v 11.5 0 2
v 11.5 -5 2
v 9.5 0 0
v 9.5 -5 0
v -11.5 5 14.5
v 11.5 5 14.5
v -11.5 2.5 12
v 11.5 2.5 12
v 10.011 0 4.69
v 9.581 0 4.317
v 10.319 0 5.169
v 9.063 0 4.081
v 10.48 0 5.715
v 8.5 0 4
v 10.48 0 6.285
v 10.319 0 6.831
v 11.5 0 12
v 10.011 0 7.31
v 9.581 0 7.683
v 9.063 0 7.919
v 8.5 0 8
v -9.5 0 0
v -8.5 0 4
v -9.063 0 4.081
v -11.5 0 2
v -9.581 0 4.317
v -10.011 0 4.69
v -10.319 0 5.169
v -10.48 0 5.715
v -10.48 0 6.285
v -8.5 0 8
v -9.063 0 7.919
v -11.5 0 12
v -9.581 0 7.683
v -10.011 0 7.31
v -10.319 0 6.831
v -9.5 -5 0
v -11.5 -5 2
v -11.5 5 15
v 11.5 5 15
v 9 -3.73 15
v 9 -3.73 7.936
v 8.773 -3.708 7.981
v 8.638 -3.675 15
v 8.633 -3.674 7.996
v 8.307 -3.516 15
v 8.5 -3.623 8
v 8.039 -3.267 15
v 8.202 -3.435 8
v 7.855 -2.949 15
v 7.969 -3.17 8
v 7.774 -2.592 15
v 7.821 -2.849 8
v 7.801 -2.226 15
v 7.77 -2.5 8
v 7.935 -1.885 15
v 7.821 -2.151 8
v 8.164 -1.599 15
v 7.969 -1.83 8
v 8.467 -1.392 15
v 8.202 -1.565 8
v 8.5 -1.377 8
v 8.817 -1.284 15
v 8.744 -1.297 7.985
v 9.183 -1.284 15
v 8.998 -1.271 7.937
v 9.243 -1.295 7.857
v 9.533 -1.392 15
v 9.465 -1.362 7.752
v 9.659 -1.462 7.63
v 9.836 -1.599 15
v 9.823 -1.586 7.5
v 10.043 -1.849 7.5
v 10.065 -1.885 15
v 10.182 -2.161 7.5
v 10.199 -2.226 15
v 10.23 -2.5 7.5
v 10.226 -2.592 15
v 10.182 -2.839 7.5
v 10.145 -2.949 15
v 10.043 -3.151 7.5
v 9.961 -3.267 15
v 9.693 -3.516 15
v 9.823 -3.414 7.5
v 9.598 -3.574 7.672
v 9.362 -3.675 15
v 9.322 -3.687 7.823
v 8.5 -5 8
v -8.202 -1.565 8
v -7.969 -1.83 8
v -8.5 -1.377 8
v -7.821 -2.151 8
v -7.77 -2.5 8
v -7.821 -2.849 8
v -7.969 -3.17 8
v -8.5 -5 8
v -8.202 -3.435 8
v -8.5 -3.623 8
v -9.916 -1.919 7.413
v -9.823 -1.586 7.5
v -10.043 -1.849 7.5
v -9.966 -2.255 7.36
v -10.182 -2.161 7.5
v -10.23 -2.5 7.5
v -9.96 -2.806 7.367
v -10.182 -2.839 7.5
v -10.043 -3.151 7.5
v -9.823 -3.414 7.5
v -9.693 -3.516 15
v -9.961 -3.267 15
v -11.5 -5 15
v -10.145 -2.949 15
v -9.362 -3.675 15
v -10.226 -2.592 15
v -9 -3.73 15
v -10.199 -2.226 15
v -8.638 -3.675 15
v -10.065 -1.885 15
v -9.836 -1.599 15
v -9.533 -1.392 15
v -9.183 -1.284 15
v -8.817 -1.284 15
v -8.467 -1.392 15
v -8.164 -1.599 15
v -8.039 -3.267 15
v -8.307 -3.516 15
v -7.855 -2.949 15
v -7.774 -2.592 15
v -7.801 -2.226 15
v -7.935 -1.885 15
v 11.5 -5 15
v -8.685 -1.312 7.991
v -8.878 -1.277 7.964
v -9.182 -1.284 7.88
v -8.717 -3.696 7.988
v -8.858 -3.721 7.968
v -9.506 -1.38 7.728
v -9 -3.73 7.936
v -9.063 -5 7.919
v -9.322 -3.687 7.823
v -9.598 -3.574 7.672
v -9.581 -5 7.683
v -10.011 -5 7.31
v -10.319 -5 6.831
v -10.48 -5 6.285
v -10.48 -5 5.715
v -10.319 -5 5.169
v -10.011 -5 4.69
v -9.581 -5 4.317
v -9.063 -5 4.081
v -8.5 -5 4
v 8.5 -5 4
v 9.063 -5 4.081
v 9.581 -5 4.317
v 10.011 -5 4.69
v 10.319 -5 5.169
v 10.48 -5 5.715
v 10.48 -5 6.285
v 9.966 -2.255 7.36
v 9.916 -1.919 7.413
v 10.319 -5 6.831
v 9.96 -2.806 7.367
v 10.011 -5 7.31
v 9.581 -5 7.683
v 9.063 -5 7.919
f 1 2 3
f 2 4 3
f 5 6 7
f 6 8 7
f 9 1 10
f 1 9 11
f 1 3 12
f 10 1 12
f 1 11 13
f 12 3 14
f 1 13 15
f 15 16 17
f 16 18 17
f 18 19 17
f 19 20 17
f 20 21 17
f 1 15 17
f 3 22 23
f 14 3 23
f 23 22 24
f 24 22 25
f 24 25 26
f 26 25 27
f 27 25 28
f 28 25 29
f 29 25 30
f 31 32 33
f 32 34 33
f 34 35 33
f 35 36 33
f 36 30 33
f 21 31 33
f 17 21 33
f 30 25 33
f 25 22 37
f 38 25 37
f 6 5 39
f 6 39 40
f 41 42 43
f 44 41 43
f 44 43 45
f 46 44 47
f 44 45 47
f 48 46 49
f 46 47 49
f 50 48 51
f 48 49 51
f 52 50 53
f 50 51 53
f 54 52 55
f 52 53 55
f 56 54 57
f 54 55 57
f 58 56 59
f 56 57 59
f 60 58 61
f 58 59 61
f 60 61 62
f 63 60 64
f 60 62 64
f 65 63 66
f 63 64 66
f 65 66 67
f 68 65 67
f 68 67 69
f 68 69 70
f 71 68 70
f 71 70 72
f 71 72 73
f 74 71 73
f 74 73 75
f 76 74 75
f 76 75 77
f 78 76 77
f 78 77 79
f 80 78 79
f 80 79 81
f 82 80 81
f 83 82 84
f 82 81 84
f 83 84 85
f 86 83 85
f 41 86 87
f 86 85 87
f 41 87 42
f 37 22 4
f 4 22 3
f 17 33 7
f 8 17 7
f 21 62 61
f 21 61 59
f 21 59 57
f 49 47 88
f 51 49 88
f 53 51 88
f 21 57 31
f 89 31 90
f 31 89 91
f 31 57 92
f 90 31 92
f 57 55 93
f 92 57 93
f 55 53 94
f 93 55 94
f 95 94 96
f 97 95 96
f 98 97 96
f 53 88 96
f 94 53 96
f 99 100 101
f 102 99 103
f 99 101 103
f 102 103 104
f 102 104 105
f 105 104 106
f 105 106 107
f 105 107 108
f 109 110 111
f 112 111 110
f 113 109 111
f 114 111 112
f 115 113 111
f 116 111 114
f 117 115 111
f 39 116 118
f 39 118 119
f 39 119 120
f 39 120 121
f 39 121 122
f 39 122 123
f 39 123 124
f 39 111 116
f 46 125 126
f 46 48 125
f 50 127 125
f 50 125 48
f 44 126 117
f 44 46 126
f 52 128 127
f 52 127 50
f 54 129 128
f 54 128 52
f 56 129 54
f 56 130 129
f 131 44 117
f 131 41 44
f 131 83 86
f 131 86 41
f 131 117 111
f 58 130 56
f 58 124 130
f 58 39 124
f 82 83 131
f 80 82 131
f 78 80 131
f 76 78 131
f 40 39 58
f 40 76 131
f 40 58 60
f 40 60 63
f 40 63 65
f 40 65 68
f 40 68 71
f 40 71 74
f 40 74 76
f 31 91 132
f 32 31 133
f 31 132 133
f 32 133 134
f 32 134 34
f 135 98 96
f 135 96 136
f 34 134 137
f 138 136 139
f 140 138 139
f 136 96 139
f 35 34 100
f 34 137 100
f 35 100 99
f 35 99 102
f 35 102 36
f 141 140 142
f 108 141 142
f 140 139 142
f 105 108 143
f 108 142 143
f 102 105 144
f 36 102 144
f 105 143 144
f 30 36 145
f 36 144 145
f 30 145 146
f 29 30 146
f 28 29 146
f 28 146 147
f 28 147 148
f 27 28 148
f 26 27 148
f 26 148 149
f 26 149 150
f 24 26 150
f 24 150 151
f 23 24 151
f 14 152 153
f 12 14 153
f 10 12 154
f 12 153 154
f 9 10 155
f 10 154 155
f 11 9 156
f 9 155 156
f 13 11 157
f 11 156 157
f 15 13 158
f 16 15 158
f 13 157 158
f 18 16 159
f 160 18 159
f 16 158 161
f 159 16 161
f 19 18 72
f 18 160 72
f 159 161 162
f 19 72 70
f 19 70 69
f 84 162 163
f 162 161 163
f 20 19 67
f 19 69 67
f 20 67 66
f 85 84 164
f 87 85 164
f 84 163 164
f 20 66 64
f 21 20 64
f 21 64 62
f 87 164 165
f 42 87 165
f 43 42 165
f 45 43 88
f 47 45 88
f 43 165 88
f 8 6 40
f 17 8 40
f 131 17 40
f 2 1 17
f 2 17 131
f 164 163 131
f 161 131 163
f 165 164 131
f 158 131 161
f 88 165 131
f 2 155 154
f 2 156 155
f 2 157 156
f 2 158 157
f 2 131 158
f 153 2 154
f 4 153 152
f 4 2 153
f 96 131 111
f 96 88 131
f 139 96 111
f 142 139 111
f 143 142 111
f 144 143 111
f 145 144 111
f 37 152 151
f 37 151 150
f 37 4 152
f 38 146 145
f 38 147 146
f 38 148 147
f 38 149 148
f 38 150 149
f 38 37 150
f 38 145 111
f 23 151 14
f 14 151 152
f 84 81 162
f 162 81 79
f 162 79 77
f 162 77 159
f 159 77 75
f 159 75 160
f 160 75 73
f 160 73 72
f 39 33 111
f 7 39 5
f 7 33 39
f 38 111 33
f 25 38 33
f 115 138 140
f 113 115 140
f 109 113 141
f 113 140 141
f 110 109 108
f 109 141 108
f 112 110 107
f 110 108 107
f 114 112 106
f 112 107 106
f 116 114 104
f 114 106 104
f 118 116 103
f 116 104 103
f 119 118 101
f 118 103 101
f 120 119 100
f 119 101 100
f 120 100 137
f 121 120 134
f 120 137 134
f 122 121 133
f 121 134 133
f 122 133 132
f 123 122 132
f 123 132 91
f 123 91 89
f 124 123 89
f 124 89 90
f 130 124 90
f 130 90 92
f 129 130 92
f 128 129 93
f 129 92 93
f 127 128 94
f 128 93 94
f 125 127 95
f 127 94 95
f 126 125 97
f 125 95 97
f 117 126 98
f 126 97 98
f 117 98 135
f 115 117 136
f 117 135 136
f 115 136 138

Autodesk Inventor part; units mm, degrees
ref_plane "YZ Plane" through (0, 0, 0) normal (1, 0, 0) x (0, 1, 0)
ref_plane "XZ Plane" through (0, 0, 0) normal (0, 1, 0) x (-1, 0, 0)
ref_plane "XY Plane" through (0, 0, 0) normal (0, 0, 1) x (1, 0, 0)
sketch "Esboço1" plane through (0, 0, 0) normal (0, 0, 1) x (1, 0, 0)
  line L0 (-11.5, 5) -> (11.5, 5)
  line L1 (11.5, 5) -> (11.5, -5)
  line L2 (11.5, -5) -> (-11.5, -5)
  line L3 (-11.5, -5) -> (-11.5, 5)
  line L4 (-11.5, 5) -> (11.5, -5) construction
  line L5 (11.5, 5) -> (-11.5, -5) construction
  point P0 (0, 0)
  dimension "d0" = 10
  dimension "d1" = 23
extrude "Extrusão1" add sketch "Esboço1" along normal blind 15
chamfer "Chanfro1" distance 2 angle 45 2 edges at (-11.5, 0, 0) (11.5, 0, 0)
sketch "Esboço4" plane through (-11.5, -5, 15) normal (0, -1, 0) x (1, 0, 0)
  line L0 (11.5, -15) -> (11.5, -9)
  line L1 (3, -9) -> (20, -9) construction
  line L2 (3, -11) -> (20, -11)
  line L3 (20, -7) -> (3, -7)
  arc A0 (3, -7) -> (3, -11) centre (3, -9) ccw
  arc A1 (20, -11) -> (20, -7) centre (20, -9) ccw
  line L4 (23, -13) -> (23, 0) projected
  dimension "d18" = 6
  dimension "d19" = 4
  dimension "d20" = 3
extrude "Extrusão3" cut sketch "Esboço4" against normal through all
sketch "Esboço2" plane through (0, 0, 15) normal (0, 0, 1) x (1, 0, 0)
  line L0 (11.5, 5) -> (-11.5, 5) projected
  line L1 (-11.5, -5) -> (11.5, -5) projected
  line L2 (-9, -2.5) -> (9, -2.5)
  line L3 (0, 0) -> (0, -2.5)
  line L4 (-11.5, 5) -> (-11.5, -5) projected
  dimension "d32" = 2.5
  dimension "d36" = 2.5
hole "Furo1" at (-9, -2.5, 15) at (9, -2.5, 15) direction (0, 0, -1) diameter 2.459 depth 7.5 tip angle 118 thread size "M3x0.5" class "6H" standard "ISO Metric profile"
sketch "Esboço5" plane through (0, 0, 0) normal (1, 0, 0) x (0, 1, 0)
  line L0 (5, 0) -> (-5, 0) projected
  line L1 (5, 0) -> (0, 0)
  line L2 (0, 0) -> (0, 12)
  line L3 (0, 12) -> (5, 12)
  line L4 (5, 12) -> (5, 0)
  line L5 (-5, 0) -> (-5, 2) projected
  line L6 (5, 15) -> (-5, 15) projected
  point P0 (0, 0)
  point P1 (2.5, 0)
  dimension "d27" = 5
  dimension "d29" = 3
extrude "Extrusão4" cut sketch "Esboço5" along normal through all both and the other way through all
chamfer "Chanfro2" distance 2.5 angle 45 1 edges at (0, 5, 12)
properties part number "SUPORTE ADAPTADOR USB TIPO C REV03 - PARTE 02" material "Alumínio 6061"
